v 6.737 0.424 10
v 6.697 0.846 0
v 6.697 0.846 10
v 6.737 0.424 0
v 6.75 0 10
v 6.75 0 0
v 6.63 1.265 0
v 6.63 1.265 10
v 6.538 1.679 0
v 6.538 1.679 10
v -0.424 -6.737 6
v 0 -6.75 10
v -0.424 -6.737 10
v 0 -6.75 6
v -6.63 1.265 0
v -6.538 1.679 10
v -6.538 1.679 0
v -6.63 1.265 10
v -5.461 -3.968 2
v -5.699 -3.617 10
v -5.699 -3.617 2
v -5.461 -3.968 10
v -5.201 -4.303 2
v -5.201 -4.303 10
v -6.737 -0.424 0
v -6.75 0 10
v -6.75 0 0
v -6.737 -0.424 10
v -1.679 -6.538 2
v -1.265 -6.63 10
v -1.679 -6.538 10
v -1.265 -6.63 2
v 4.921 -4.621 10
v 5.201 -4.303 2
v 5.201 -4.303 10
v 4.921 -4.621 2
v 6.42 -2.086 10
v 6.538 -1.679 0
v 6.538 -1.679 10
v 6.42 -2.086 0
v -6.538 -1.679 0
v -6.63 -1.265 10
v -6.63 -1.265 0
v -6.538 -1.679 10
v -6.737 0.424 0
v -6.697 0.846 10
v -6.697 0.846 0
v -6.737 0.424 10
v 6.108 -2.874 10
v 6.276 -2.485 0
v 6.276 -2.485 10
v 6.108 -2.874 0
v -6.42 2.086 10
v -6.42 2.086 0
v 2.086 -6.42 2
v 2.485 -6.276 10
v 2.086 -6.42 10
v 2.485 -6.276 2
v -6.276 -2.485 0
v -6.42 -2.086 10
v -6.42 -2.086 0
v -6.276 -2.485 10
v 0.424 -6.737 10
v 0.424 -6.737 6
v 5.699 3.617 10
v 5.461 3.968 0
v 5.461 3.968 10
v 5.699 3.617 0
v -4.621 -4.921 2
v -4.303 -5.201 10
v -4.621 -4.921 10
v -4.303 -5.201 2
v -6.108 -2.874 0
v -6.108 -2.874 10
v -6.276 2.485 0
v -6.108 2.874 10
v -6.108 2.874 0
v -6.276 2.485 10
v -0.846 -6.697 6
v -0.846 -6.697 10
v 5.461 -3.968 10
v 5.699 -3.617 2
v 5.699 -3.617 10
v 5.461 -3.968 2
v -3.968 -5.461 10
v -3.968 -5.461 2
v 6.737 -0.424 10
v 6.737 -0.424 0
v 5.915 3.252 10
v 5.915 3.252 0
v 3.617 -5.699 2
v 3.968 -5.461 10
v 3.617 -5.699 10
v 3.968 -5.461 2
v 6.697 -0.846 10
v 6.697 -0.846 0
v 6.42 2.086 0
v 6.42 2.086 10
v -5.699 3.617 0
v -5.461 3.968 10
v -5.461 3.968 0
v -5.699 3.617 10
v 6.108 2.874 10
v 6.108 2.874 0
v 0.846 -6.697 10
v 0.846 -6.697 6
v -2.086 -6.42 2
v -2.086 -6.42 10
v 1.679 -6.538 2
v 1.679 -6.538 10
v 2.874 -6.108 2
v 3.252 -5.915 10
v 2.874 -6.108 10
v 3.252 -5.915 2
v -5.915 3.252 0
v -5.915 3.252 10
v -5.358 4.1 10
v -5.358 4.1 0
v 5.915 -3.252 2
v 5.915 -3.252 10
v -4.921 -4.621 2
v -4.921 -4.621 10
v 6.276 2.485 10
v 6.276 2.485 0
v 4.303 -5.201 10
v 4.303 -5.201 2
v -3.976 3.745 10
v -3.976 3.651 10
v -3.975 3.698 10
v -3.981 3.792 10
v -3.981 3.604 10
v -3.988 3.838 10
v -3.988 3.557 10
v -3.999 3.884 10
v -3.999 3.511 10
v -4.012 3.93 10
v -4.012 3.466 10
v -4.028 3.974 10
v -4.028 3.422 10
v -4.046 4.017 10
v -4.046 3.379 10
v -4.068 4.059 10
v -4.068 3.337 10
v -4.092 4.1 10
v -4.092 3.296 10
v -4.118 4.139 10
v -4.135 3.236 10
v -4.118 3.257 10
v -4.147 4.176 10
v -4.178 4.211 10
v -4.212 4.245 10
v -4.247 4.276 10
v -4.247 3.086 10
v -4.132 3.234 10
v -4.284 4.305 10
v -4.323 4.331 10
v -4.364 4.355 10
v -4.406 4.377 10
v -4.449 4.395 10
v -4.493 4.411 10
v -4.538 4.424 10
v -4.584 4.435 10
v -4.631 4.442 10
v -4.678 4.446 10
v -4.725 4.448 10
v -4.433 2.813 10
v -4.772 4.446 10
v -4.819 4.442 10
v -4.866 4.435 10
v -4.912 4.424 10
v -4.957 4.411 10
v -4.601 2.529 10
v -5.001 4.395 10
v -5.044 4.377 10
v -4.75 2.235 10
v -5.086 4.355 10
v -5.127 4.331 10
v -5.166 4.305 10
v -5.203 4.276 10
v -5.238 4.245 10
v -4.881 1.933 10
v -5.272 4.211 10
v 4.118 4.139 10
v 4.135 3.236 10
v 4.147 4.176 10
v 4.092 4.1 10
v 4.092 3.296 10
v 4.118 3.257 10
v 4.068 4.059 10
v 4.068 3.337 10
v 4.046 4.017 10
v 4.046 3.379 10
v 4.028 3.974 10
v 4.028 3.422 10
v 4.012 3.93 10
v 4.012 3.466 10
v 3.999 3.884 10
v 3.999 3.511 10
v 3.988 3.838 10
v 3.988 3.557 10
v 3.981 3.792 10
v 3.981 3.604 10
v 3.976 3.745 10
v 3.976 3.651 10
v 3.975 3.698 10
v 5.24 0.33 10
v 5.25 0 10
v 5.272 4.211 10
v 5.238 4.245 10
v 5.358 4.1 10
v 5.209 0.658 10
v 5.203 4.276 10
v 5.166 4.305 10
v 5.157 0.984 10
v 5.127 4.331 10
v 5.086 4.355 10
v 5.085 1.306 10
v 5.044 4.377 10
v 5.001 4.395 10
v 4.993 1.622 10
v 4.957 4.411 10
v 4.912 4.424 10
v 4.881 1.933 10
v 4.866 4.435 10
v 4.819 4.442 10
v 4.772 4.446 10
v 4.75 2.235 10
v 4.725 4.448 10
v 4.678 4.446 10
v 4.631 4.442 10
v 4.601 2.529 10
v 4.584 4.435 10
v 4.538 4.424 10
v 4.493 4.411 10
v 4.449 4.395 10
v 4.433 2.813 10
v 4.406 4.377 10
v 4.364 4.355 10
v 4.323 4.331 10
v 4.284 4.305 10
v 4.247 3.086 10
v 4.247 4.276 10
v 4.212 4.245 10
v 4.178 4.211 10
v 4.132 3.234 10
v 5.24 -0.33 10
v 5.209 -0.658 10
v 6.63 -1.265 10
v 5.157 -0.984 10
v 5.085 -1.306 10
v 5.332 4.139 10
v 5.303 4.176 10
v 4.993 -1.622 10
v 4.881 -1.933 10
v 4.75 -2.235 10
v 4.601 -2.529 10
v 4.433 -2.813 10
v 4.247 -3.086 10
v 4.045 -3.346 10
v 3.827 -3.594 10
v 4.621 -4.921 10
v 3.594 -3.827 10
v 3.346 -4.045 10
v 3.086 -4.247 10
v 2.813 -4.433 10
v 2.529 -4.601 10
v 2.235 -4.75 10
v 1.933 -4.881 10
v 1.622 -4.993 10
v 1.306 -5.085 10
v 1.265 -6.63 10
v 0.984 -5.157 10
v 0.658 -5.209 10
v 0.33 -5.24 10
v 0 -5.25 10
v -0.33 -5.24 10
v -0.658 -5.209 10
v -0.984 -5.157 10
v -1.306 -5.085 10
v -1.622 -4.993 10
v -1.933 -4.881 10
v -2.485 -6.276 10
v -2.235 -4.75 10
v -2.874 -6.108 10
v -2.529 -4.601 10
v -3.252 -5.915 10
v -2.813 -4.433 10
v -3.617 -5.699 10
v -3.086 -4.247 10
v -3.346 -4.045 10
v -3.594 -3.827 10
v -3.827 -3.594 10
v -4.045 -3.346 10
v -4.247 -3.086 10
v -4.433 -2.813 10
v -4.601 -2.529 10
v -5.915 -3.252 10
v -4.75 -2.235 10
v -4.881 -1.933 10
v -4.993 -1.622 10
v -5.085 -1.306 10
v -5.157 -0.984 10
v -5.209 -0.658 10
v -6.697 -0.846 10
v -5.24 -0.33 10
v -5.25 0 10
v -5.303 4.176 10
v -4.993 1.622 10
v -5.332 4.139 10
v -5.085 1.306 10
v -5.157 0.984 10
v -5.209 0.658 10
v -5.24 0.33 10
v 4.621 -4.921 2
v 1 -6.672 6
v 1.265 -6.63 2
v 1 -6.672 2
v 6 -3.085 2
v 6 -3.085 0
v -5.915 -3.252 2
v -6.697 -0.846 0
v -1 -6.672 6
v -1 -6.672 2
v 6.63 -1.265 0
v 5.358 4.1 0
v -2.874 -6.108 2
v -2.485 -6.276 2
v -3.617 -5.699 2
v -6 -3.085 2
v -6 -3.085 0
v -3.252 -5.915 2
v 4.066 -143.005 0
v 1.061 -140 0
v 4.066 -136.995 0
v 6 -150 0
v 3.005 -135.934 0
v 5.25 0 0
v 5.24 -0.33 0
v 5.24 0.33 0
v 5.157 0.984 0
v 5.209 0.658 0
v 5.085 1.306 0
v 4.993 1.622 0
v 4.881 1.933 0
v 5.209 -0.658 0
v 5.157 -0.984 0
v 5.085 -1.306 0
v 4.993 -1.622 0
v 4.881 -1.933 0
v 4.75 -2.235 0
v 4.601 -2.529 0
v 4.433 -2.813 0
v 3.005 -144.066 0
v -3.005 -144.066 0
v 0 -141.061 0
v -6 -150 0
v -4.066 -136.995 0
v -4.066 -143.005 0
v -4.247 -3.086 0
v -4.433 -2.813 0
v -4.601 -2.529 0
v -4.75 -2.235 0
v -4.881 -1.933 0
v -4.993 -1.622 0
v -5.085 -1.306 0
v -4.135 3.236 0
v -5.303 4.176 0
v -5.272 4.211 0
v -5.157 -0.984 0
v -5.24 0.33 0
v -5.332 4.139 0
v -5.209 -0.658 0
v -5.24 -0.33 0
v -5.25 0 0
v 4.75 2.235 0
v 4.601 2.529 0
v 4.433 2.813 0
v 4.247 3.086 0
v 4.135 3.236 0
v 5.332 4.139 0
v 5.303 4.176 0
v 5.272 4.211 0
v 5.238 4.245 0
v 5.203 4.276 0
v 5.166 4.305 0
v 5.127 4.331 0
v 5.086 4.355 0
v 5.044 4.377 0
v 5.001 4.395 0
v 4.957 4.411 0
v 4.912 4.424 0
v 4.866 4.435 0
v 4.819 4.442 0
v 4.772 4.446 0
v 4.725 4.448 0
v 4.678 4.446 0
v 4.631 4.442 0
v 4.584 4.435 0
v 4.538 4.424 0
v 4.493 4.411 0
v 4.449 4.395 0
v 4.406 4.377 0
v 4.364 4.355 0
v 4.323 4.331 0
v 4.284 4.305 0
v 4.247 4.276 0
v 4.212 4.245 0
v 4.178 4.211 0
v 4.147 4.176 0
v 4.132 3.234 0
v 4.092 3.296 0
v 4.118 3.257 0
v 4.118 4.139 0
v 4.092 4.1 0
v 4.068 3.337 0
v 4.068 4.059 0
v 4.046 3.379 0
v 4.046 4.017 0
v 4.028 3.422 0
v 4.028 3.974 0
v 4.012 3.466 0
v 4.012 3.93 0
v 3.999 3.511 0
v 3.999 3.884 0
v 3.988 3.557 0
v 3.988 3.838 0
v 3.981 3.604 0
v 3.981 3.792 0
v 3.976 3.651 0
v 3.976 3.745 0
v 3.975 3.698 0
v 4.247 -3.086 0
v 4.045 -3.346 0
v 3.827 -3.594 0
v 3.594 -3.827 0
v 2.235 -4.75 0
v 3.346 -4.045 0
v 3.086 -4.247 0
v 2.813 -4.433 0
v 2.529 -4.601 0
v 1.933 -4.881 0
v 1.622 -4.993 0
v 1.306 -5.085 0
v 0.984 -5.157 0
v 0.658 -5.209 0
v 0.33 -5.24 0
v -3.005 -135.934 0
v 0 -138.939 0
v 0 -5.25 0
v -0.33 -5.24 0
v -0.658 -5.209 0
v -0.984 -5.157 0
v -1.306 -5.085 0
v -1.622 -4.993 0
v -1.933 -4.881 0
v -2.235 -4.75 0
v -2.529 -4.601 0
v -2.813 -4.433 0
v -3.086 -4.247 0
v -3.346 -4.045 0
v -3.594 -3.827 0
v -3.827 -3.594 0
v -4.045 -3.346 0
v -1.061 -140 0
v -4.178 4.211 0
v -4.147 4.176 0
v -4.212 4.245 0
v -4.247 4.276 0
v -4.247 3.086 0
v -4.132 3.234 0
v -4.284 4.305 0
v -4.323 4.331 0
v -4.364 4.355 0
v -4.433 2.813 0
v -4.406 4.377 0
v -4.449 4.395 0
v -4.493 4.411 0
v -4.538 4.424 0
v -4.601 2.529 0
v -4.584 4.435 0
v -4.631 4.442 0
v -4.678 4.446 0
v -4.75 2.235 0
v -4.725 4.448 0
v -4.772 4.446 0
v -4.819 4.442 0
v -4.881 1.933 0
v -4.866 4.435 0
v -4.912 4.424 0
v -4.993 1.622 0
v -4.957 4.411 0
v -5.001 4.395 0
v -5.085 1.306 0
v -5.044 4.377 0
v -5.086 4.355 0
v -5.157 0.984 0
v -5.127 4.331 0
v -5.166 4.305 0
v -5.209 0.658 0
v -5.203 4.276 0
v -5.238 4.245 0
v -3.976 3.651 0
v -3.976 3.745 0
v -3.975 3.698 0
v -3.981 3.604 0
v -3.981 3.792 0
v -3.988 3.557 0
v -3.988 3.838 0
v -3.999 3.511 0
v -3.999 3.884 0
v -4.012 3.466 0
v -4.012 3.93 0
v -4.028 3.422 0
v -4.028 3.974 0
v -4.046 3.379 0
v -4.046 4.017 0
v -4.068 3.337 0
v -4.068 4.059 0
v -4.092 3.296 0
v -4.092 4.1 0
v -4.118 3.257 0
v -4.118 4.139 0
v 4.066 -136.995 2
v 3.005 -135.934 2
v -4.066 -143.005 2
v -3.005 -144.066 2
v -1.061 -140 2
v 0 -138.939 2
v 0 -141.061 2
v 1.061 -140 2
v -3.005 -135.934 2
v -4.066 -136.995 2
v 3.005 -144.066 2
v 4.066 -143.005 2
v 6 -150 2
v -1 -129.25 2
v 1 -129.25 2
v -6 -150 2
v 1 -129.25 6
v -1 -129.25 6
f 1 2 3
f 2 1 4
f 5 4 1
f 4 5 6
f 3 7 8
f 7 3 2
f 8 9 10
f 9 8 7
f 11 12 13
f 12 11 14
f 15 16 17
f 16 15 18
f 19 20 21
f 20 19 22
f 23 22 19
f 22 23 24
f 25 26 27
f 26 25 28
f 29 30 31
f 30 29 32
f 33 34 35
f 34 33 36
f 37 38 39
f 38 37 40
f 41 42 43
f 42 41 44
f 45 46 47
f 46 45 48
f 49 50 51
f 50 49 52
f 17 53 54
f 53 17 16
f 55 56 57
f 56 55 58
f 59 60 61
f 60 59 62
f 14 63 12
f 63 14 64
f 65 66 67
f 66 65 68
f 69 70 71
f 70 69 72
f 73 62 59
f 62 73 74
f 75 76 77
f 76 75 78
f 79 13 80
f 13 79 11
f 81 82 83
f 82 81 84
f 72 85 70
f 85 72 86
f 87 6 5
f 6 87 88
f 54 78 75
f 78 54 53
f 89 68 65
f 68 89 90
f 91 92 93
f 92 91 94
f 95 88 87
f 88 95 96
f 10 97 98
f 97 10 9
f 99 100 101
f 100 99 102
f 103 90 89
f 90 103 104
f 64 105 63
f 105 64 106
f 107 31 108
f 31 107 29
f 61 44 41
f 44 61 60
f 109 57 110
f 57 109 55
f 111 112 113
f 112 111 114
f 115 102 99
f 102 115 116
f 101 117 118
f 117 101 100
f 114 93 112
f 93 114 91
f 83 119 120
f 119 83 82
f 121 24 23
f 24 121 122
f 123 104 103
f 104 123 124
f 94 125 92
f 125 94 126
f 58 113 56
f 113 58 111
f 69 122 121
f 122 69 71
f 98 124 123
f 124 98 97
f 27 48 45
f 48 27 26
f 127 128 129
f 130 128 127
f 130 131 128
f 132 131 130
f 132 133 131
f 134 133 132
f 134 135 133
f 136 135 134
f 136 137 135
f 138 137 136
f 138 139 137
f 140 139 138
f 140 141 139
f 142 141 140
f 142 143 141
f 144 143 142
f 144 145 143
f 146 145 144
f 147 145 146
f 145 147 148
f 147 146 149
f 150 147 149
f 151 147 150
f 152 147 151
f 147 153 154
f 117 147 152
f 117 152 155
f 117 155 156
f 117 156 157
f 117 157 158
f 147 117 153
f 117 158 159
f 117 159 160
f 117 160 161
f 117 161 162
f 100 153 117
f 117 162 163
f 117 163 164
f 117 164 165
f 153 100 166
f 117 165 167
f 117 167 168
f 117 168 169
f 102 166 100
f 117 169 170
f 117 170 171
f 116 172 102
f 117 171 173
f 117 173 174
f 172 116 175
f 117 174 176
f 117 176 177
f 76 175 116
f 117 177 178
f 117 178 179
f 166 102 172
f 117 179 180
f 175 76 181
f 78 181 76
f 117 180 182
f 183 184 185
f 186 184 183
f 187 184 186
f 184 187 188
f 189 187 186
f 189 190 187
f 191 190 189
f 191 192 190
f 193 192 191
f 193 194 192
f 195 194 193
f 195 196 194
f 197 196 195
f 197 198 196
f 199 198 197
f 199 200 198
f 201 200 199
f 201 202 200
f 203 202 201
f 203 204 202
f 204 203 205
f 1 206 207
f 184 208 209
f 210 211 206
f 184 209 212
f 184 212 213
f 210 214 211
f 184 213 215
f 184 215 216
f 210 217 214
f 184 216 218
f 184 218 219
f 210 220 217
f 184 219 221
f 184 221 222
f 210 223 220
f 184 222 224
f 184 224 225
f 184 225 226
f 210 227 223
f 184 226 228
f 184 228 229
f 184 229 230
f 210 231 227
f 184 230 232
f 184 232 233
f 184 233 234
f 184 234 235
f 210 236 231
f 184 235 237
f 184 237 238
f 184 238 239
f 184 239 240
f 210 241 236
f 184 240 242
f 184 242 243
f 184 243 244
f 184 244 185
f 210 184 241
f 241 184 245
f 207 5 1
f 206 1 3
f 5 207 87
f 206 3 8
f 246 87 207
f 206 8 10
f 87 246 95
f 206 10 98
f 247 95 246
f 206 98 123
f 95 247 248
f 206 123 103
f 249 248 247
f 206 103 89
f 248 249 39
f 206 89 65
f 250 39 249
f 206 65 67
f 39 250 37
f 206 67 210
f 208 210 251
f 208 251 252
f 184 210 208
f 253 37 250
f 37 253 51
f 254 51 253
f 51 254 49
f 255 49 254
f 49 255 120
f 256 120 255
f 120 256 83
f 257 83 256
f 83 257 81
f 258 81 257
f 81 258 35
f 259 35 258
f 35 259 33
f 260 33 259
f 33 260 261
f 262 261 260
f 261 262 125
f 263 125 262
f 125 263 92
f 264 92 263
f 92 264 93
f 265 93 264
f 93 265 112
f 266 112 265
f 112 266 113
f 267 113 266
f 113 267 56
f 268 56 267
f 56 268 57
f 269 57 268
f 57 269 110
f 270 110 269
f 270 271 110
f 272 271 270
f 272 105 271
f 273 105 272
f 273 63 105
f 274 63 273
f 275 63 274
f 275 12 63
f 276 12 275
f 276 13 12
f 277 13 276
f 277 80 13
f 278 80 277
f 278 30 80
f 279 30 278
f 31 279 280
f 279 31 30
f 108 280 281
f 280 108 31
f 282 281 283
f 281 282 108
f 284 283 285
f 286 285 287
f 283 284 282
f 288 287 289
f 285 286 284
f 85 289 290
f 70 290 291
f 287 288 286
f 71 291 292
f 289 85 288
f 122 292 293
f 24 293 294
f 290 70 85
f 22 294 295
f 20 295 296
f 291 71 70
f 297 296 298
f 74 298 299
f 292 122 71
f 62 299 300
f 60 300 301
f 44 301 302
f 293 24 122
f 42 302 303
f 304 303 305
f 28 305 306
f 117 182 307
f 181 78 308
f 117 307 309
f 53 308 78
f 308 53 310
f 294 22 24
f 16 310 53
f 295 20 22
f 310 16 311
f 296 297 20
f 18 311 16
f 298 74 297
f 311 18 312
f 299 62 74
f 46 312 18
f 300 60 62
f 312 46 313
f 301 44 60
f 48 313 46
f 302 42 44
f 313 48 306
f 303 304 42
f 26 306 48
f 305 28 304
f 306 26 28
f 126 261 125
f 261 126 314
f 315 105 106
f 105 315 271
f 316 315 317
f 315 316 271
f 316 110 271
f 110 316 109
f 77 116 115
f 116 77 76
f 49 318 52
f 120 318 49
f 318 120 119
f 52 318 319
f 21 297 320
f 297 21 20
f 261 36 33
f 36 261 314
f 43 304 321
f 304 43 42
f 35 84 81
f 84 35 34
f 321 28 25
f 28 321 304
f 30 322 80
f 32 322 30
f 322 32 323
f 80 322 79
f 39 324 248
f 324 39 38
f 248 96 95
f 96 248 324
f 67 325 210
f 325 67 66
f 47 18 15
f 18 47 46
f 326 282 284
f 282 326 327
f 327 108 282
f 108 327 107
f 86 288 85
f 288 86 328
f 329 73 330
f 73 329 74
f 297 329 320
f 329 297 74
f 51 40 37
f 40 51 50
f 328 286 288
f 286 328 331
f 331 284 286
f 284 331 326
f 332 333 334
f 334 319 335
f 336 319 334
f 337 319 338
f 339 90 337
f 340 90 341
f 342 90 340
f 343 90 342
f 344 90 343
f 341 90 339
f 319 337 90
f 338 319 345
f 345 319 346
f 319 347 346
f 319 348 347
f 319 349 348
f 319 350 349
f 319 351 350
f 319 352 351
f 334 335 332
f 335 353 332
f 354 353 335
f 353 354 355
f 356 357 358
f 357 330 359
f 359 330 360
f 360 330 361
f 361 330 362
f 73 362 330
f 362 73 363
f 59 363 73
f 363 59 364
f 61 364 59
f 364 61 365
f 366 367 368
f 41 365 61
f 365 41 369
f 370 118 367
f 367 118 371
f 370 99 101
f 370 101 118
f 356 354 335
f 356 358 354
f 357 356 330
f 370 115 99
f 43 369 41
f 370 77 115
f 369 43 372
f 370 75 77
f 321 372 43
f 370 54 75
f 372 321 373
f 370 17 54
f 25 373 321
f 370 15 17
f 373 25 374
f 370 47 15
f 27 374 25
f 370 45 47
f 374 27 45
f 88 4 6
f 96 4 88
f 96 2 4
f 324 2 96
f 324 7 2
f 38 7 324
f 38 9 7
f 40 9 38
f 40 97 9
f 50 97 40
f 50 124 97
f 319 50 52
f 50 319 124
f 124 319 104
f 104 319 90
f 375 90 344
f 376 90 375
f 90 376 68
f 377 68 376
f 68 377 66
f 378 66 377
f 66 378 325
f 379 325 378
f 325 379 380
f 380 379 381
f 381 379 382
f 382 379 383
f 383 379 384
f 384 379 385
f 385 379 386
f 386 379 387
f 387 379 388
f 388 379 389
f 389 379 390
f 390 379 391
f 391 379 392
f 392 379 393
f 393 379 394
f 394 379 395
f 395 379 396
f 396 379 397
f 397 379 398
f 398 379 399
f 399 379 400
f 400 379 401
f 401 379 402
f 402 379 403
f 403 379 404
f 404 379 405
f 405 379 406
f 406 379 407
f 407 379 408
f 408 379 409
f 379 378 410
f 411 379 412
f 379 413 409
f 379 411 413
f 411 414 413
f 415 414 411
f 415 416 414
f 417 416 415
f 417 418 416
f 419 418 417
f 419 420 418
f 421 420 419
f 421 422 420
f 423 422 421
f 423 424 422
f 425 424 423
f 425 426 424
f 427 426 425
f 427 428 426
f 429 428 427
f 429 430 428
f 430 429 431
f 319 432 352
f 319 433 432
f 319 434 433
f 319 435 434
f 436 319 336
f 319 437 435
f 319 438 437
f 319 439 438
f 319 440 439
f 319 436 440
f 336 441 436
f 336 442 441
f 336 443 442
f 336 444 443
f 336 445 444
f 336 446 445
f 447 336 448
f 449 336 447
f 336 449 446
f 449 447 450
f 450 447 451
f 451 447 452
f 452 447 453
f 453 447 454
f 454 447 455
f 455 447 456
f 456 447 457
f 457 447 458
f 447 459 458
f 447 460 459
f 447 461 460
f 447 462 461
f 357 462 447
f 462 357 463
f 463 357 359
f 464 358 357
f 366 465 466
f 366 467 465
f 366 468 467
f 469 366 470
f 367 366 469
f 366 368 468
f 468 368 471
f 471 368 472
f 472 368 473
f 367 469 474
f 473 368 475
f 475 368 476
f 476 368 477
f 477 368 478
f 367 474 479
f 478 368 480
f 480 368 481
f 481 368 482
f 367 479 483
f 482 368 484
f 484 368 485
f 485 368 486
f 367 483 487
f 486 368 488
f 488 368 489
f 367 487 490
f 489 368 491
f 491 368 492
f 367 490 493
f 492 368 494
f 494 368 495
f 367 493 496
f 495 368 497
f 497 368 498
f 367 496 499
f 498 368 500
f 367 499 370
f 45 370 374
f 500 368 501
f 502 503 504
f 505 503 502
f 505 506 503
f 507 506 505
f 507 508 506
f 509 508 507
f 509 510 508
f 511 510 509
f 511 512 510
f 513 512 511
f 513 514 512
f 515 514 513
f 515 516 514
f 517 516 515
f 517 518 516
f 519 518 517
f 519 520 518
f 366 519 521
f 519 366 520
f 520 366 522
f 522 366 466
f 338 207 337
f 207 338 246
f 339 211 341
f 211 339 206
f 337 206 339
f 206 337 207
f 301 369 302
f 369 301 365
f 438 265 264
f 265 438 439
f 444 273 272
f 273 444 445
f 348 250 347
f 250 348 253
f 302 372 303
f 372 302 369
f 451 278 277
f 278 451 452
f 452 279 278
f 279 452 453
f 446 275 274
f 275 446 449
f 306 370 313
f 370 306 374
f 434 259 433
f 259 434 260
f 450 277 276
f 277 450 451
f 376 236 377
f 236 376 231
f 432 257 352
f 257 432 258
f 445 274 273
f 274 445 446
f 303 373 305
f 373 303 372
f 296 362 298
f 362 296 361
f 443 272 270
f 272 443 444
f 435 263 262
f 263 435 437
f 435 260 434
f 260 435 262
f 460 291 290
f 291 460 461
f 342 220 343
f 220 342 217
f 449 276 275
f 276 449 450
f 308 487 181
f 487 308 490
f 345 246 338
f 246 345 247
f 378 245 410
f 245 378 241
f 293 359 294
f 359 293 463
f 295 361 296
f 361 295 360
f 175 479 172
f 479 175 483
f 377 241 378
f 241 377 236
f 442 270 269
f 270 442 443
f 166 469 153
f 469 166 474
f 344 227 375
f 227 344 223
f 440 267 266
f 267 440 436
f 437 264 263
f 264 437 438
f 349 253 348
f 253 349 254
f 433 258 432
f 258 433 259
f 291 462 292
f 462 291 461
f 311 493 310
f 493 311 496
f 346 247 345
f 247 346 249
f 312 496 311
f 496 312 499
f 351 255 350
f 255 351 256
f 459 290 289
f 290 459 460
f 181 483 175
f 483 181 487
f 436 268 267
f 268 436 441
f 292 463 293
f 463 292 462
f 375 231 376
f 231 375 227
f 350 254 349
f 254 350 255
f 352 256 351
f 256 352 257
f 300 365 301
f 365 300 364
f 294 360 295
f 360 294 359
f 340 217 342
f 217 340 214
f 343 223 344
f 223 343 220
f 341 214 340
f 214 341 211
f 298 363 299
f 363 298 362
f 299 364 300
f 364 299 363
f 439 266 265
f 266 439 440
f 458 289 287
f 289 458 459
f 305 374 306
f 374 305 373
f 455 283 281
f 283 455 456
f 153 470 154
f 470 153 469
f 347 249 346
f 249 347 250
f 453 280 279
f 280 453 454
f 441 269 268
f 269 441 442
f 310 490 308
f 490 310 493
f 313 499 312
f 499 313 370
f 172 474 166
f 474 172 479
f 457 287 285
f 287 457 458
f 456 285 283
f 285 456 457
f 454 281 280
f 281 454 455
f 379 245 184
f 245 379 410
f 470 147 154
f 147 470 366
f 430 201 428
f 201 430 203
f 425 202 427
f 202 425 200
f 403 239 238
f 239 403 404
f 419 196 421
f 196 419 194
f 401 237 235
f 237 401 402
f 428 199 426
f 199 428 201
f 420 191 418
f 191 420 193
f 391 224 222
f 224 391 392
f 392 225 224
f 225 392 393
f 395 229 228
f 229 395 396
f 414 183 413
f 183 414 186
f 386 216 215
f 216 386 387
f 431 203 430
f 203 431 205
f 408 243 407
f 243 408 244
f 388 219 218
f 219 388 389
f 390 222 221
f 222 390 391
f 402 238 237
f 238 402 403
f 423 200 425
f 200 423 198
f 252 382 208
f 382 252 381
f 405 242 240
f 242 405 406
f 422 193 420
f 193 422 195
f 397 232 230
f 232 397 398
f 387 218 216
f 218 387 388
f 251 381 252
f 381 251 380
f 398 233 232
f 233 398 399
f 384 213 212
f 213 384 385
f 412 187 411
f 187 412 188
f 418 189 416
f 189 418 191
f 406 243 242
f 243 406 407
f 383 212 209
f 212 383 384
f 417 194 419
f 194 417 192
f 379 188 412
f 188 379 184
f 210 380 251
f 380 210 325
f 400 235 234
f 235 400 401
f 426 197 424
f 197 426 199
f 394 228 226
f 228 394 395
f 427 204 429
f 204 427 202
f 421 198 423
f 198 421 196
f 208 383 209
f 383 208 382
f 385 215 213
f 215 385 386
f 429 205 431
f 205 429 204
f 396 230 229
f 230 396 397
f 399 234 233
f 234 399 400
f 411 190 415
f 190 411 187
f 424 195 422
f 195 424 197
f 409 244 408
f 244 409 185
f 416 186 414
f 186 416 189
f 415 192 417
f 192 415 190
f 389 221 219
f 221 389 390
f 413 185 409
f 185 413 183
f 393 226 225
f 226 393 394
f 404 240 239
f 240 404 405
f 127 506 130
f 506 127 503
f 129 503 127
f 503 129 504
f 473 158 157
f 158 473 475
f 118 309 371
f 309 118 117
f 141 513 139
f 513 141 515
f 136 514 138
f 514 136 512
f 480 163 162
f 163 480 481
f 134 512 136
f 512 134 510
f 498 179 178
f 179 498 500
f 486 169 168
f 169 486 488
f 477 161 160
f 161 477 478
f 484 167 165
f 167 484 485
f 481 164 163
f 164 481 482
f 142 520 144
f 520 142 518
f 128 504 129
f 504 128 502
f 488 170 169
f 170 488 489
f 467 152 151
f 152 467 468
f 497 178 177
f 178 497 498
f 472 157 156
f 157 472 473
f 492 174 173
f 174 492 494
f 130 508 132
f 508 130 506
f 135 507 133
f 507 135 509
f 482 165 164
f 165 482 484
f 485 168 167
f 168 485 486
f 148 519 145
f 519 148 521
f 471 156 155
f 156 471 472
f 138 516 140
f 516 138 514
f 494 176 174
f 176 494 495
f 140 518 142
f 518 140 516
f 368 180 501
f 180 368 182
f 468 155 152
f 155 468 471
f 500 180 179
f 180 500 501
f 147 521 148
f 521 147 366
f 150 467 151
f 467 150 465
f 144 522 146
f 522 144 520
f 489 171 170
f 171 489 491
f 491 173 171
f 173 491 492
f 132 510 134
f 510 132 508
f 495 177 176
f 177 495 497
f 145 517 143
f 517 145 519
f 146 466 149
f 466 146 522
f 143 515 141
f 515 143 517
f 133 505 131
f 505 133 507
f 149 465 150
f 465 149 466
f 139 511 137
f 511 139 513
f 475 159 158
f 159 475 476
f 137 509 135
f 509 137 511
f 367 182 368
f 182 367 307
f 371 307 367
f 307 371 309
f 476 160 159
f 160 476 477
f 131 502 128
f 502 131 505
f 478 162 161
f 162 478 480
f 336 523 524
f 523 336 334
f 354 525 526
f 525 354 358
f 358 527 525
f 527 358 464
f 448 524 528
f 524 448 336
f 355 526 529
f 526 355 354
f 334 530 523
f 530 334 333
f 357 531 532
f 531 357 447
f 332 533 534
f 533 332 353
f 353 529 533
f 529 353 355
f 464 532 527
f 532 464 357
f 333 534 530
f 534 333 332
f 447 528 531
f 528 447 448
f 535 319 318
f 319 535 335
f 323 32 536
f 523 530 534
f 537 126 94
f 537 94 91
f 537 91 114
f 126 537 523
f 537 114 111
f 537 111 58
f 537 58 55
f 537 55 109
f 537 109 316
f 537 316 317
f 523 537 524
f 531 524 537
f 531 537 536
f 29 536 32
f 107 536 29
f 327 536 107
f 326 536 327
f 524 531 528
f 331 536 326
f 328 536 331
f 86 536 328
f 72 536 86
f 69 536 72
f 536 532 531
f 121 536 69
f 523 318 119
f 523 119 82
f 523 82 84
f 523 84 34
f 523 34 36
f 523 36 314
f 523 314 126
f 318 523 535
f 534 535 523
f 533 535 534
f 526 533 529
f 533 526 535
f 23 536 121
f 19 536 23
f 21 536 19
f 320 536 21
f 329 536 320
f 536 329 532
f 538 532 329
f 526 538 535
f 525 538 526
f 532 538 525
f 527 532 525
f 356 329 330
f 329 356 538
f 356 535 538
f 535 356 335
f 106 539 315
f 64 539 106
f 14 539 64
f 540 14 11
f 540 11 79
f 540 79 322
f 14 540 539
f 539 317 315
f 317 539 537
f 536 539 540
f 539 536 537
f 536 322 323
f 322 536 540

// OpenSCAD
$fn = 100;  // Number of fragments used to construct curves and circles



module sprinkler_holder()
{
    // Dimensions of ring
    inner_diameter = 10.5;
    inner_radius = inner_diameter/2;
    thickness = 1.5;
    outer_radius = inner_radius + thickness;
    height = 10;

    // Ring opening
    opening_percent = 0.9;
    ring_middle = inner_radius+thickness/2;
    opening_cutter_y = opening_percent * inner_radius;
    opening_cutter_x = sqrt( ring_middle^2 - opening_cutter_y^2);
    opening_cutter_rotation = asin(opening_cutter_y/ring_middle);
    
    // holder
    holder_width = 12;
    holder_length = 150;
    holder_thickness = 2;
    
    // stabilizer
    stabilizer_height = 6;
    
    // anker
    anker_width = 10;
    anker_thickness = 1.5;
    
    // other values
    tolerance = 0.02;
    tolerance1 = 1+tolerance;

    // whole object
    union() {
        // tube grabber
        translate([0,0,height/2]) {
            difference() {
                cylinder(h = height, r = outer_radius, center=true);
                
                cylinder(h = height + 2*tolerance, r = outer_radius - thickness, center=true);

                // arc cutout
                scale(2)
                translate([0, 0, -height/2]) 
                linear_extrude(height)
                polygon(points=[
                    [0,0],
                    [opening_cutter_y, opening_cutter_x],
                    [opening_cutter_y, tolerance1*outer_radius],
                    [-opening_cutter_y, tolerance1*outer_radius],
                    [-opening_cutter_y, opening_cutter_x]
                ]);
            }
            
            // roundings at tube grabber
            translate([opening_cutter_y, opening_cutter_x,0])
            cylinder(h=height, d=thickness, center=true);
            translate([-opening_cutter_y, opening_cutter_x,0])
            cylinder(h=height, d=thickness, center=true);
        }
              
        // holder plate
        difference() {
            translate([-holder_width/2, -holder_length, 0])
            cube([holder_width, holder_length, holder_thickness]);
            cylinder(h = height + 2*tolerance, r = outer_radius - thickness, center=true);
            
            // anker connection cut-out
            translate([0,-holder_length+anker_width,0])
            rotate([0,0,45])
            translate([0,0,(holder_thickness-tolerance)/2])
            scale([1,1,tolerance1])
            union() {
                cube([anker_width, anker_thickness, holder_thickness], center=true);
                rotate([0,0,90])
                cube([anker_width, anker_thickness, holder_thickness], center=true);
            }
        }
        
        // stabilizer   
        rotate([0,0,180])
        translate([-holder_thickness/2, (inner_radius+thickness/2), 0])
        cube([holder_thickness, holder_length-(inner_radius+thickness)-2*anker_width, stabilizer_height]);
    }
}

sprinkler_holder();
